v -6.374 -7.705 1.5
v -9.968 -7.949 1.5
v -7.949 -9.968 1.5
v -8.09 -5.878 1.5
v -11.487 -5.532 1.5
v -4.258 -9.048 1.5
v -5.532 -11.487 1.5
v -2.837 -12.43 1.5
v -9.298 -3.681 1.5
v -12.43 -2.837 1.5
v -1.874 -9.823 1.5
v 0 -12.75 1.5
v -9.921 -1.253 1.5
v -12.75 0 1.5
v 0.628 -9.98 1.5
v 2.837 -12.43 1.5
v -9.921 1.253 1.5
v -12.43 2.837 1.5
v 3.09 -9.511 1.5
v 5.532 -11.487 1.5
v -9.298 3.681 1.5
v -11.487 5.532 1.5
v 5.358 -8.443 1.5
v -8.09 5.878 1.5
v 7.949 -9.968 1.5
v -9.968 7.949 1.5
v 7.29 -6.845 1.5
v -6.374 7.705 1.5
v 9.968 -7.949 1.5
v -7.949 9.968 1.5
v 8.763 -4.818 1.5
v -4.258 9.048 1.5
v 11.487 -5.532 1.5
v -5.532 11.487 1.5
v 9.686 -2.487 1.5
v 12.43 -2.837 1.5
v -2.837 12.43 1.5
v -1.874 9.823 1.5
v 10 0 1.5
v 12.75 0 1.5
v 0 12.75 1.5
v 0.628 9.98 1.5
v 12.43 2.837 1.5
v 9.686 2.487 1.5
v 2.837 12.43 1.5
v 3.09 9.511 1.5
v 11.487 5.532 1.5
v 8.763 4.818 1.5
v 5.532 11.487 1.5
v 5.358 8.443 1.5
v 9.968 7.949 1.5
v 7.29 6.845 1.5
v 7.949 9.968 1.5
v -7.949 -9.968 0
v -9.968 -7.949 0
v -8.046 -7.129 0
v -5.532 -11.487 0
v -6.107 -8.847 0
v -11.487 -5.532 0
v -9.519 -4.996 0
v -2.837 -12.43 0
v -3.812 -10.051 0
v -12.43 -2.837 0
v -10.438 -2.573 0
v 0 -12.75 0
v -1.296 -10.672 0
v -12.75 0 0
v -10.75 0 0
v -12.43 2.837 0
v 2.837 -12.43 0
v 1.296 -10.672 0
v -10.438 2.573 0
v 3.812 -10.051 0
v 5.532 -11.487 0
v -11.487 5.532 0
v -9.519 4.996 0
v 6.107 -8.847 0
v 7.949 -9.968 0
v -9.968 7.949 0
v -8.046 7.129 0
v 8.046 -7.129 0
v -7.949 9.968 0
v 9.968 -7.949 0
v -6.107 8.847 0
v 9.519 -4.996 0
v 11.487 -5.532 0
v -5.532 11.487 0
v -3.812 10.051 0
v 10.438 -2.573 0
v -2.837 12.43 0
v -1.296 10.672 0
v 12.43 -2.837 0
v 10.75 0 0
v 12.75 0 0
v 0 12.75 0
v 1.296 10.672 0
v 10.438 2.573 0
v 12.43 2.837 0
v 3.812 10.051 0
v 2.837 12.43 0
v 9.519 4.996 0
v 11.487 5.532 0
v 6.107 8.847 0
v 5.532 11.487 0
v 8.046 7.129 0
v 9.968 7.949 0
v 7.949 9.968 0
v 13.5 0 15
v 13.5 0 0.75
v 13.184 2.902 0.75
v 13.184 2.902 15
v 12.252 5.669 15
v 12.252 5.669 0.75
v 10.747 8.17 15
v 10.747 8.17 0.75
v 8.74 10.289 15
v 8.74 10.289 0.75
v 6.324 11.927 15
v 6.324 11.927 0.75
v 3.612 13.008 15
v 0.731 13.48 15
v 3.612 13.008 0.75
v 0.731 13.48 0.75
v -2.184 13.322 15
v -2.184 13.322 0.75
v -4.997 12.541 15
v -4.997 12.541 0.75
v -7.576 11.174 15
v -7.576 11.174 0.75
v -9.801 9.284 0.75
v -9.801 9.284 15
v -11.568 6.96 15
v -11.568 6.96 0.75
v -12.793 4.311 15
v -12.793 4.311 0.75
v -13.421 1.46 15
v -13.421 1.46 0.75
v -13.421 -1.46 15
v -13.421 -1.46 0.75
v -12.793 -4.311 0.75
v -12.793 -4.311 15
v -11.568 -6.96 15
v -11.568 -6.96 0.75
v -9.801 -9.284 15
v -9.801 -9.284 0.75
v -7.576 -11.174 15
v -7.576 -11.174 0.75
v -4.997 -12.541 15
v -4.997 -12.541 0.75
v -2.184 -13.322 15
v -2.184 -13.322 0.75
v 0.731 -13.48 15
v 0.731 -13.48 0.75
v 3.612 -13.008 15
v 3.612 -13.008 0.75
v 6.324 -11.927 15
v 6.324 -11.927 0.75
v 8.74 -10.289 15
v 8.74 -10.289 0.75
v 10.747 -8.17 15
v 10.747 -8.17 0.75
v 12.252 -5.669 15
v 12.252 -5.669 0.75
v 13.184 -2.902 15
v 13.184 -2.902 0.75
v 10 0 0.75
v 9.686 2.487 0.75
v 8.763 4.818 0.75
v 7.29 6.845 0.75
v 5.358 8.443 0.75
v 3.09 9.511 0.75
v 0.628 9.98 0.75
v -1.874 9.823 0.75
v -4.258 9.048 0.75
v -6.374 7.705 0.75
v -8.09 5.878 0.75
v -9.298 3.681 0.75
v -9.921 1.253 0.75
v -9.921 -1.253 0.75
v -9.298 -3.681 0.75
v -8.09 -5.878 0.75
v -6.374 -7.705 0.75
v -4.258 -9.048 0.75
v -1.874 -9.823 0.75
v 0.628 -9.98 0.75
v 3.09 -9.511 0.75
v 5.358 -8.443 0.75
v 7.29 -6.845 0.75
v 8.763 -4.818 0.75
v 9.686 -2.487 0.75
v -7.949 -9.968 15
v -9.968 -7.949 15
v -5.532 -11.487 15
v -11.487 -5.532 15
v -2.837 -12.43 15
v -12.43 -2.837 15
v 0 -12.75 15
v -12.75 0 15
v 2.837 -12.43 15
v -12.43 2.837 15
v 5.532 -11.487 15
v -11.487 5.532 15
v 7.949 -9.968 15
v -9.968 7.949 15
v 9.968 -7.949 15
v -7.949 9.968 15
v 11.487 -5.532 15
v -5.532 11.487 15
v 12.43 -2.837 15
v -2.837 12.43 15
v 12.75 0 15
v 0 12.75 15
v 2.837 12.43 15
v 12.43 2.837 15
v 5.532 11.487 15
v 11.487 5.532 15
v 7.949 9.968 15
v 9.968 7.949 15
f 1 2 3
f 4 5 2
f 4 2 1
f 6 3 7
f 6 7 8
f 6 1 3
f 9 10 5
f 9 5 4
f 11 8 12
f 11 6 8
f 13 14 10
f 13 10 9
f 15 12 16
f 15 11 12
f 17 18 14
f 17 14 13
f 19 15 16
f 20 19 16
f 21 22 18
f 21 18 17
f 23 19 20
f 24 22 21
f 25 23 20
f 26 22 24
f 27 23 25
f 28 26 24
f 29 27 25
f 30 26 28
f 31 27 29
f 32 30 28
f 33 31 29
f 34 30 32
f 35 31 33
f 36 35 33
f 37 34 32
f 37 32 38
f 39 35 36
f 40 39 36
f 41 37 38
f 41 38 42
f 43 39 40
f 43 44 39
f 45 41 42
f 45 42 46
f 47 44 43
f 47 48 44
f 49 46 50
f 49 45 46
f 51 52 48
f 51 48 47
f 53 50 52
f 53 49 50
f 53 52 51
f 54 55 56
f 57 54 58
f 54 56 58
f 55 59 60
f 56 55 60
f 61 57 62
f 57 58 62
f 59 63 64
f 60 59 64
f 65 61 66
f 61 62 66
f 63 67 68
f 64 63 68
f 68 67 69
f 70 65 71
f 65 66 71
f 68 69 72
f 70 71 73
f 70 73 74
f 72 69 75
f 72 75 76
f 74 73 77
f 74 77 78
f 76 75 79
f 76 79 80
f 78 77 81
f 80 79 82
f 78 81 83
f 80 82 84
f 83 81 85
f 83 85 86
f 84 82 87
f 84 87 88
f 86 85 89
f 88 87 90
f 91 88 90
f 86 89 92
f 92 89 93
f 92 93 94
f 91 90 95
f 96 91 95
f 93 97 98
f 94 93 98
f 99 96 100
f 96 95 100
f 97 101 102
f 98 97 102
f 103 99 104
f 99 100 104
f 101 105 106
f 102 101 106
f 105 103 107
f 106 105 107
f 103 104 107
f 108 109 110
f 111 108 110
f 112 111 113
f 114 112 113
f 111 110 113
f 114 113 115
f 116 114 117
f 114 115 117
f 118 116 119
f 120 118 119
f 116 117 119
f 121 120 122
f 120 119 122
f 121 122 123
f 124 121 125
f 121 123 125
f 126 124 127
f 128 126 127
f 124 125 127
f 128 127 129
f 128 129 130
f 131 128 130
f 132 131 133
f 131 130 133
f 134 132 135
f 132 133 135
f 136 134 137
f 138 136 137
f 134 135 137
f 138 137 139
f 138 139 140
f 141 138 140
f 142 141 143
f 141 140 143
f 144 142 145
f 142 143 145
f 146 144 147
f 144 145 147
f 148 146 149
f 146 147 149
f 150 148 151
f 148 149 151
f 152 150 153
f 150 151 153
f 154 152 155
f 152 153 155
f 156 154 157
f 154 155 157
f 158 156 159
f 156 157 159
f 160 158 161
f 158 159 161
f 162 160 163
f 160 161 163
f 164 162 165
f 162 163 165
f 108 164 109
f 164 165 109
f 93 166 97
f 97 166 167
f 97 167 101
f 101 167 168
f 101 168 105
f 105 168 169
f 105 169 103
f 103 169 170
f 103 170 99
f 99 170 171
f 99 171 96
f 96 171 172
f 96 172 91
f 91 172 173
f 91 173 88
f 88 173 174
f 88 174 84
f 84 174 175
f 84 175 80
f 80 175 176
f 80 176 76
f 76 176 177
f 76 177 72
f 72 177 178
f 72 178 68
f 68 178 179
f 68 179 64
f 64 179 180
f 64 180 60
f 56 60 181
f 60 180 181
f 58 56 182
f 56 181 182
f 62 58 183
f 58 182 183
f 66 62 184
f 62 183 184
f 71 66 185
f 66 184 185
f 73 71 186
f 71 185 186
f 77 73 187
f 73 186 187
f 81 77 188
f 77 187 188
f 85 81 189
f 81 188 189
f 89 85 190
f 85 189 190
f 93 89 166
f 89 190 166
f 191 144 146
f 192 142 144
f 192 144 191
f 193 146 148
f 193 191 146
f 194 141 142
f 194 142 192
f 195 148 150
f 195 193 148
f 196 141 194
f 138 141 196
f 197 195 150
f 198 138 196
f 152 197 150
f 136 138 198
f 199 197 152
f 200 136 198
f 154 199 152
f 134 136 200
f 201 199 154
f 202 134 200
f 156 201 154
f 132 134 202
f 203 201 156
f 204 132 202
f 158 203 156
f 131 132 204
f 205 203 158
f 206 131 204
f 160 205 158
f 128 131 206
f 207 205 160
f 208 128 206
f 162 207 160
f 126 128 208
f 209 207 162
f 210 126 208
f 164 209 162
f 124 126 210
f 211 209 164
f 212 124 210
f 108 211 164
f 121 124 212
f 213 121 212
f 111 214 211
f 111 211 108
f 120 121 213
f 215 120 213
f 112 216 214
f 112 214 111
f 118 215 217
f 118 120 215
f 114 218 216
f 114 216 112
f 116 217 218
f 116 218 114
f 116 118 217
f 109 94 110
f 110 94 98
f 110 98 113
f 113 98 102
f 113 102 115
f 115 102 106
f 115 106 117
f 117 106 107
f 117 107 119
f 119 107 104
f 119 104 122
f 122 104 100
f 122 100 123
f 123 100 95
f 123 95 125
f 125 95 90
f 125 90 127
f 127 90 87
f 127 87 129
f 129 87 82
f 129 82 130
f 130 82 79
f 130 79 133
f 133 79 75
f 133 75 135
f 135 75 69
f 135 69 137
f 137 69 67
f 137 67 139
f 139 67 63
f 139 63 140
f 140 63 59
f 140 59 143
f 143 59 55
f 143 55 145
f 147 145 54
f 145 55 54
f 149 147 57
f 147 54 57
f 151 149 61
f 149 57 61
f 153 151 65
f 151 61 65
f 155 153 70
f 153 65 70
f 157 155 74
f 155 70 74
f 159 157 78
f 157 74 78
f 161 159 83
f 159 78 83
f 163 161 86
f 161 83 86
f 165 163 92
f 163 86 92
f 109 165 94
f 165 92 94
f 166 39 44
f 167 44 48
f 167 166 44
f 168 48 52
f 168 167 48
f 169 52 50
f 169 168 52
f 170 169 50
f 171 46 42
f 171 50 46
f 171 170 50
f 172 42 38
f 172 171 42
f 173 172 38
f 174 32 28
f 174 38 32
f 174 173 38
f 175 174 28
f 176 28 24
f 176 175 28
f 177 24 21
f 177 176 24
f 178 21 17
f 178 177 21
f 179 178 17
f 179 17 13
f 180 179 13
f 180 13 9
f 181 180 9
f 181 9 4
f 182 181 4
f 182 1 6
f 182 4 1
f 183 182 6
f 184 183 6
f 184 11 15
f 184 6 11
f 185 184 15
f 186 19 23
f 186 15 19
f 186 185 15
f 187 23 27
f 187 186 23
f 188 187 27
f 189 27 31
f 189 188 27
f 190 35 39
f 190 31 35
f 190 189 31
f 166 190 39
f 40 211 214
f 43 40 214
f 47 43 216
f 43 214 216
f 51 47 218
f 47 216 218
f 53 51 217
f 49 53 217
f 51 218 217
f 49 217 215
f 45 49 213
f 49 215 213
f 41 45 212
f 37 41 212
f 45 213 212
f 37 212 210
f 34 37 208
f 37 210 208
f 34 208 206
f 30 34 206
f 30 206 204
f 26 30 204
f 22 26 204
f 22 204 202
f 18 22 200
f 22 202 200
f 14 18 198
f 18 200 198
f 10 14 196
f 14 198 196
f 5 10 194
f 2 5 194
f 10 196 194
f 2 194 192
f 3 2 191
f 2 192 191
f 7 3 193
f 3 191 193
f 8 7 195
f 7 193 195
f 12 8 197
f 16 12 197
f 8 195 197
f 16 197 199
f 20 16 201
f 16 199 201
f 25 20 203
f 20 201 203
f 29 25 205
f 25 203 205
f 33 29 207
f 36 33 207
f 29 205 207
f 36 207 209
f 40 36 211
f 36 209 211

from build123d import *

# Parameters (mm, degrees)
F0_R     = 13.5
F0_R_2   = 10
F1_DEPTH = 15
F2_R     = 12.75
F3_DEPTH = 13.5
F4_SIZE  = 0.75


with BuildPart() as f1:
    # F0 (on Top) → F1 (new body)
    with BuildSketch(Plane.XY):
        Circle(F0_R)
        Circle(F0_R_2, mode=Mode.SUBTRACT)
    extrude(amount=F1_DEPTH)

    # F2 (on face) → F3 (cut)
    with BuildSketch(Plane.XY.offset(15)):
        Circle(F2_R)
    extrude(amount=-F3_DEPTH, mode=Mode.SUBTRACT)

    # F4
    f4_edges = [f1.edges().sort_by_distance(p)[0] for p in [
        (-13.5, 0, 0),
        (-10, 0, 0),
    ]]
    chamfer(f4_edges, length=F4_SIZE)


solid = f1.part
